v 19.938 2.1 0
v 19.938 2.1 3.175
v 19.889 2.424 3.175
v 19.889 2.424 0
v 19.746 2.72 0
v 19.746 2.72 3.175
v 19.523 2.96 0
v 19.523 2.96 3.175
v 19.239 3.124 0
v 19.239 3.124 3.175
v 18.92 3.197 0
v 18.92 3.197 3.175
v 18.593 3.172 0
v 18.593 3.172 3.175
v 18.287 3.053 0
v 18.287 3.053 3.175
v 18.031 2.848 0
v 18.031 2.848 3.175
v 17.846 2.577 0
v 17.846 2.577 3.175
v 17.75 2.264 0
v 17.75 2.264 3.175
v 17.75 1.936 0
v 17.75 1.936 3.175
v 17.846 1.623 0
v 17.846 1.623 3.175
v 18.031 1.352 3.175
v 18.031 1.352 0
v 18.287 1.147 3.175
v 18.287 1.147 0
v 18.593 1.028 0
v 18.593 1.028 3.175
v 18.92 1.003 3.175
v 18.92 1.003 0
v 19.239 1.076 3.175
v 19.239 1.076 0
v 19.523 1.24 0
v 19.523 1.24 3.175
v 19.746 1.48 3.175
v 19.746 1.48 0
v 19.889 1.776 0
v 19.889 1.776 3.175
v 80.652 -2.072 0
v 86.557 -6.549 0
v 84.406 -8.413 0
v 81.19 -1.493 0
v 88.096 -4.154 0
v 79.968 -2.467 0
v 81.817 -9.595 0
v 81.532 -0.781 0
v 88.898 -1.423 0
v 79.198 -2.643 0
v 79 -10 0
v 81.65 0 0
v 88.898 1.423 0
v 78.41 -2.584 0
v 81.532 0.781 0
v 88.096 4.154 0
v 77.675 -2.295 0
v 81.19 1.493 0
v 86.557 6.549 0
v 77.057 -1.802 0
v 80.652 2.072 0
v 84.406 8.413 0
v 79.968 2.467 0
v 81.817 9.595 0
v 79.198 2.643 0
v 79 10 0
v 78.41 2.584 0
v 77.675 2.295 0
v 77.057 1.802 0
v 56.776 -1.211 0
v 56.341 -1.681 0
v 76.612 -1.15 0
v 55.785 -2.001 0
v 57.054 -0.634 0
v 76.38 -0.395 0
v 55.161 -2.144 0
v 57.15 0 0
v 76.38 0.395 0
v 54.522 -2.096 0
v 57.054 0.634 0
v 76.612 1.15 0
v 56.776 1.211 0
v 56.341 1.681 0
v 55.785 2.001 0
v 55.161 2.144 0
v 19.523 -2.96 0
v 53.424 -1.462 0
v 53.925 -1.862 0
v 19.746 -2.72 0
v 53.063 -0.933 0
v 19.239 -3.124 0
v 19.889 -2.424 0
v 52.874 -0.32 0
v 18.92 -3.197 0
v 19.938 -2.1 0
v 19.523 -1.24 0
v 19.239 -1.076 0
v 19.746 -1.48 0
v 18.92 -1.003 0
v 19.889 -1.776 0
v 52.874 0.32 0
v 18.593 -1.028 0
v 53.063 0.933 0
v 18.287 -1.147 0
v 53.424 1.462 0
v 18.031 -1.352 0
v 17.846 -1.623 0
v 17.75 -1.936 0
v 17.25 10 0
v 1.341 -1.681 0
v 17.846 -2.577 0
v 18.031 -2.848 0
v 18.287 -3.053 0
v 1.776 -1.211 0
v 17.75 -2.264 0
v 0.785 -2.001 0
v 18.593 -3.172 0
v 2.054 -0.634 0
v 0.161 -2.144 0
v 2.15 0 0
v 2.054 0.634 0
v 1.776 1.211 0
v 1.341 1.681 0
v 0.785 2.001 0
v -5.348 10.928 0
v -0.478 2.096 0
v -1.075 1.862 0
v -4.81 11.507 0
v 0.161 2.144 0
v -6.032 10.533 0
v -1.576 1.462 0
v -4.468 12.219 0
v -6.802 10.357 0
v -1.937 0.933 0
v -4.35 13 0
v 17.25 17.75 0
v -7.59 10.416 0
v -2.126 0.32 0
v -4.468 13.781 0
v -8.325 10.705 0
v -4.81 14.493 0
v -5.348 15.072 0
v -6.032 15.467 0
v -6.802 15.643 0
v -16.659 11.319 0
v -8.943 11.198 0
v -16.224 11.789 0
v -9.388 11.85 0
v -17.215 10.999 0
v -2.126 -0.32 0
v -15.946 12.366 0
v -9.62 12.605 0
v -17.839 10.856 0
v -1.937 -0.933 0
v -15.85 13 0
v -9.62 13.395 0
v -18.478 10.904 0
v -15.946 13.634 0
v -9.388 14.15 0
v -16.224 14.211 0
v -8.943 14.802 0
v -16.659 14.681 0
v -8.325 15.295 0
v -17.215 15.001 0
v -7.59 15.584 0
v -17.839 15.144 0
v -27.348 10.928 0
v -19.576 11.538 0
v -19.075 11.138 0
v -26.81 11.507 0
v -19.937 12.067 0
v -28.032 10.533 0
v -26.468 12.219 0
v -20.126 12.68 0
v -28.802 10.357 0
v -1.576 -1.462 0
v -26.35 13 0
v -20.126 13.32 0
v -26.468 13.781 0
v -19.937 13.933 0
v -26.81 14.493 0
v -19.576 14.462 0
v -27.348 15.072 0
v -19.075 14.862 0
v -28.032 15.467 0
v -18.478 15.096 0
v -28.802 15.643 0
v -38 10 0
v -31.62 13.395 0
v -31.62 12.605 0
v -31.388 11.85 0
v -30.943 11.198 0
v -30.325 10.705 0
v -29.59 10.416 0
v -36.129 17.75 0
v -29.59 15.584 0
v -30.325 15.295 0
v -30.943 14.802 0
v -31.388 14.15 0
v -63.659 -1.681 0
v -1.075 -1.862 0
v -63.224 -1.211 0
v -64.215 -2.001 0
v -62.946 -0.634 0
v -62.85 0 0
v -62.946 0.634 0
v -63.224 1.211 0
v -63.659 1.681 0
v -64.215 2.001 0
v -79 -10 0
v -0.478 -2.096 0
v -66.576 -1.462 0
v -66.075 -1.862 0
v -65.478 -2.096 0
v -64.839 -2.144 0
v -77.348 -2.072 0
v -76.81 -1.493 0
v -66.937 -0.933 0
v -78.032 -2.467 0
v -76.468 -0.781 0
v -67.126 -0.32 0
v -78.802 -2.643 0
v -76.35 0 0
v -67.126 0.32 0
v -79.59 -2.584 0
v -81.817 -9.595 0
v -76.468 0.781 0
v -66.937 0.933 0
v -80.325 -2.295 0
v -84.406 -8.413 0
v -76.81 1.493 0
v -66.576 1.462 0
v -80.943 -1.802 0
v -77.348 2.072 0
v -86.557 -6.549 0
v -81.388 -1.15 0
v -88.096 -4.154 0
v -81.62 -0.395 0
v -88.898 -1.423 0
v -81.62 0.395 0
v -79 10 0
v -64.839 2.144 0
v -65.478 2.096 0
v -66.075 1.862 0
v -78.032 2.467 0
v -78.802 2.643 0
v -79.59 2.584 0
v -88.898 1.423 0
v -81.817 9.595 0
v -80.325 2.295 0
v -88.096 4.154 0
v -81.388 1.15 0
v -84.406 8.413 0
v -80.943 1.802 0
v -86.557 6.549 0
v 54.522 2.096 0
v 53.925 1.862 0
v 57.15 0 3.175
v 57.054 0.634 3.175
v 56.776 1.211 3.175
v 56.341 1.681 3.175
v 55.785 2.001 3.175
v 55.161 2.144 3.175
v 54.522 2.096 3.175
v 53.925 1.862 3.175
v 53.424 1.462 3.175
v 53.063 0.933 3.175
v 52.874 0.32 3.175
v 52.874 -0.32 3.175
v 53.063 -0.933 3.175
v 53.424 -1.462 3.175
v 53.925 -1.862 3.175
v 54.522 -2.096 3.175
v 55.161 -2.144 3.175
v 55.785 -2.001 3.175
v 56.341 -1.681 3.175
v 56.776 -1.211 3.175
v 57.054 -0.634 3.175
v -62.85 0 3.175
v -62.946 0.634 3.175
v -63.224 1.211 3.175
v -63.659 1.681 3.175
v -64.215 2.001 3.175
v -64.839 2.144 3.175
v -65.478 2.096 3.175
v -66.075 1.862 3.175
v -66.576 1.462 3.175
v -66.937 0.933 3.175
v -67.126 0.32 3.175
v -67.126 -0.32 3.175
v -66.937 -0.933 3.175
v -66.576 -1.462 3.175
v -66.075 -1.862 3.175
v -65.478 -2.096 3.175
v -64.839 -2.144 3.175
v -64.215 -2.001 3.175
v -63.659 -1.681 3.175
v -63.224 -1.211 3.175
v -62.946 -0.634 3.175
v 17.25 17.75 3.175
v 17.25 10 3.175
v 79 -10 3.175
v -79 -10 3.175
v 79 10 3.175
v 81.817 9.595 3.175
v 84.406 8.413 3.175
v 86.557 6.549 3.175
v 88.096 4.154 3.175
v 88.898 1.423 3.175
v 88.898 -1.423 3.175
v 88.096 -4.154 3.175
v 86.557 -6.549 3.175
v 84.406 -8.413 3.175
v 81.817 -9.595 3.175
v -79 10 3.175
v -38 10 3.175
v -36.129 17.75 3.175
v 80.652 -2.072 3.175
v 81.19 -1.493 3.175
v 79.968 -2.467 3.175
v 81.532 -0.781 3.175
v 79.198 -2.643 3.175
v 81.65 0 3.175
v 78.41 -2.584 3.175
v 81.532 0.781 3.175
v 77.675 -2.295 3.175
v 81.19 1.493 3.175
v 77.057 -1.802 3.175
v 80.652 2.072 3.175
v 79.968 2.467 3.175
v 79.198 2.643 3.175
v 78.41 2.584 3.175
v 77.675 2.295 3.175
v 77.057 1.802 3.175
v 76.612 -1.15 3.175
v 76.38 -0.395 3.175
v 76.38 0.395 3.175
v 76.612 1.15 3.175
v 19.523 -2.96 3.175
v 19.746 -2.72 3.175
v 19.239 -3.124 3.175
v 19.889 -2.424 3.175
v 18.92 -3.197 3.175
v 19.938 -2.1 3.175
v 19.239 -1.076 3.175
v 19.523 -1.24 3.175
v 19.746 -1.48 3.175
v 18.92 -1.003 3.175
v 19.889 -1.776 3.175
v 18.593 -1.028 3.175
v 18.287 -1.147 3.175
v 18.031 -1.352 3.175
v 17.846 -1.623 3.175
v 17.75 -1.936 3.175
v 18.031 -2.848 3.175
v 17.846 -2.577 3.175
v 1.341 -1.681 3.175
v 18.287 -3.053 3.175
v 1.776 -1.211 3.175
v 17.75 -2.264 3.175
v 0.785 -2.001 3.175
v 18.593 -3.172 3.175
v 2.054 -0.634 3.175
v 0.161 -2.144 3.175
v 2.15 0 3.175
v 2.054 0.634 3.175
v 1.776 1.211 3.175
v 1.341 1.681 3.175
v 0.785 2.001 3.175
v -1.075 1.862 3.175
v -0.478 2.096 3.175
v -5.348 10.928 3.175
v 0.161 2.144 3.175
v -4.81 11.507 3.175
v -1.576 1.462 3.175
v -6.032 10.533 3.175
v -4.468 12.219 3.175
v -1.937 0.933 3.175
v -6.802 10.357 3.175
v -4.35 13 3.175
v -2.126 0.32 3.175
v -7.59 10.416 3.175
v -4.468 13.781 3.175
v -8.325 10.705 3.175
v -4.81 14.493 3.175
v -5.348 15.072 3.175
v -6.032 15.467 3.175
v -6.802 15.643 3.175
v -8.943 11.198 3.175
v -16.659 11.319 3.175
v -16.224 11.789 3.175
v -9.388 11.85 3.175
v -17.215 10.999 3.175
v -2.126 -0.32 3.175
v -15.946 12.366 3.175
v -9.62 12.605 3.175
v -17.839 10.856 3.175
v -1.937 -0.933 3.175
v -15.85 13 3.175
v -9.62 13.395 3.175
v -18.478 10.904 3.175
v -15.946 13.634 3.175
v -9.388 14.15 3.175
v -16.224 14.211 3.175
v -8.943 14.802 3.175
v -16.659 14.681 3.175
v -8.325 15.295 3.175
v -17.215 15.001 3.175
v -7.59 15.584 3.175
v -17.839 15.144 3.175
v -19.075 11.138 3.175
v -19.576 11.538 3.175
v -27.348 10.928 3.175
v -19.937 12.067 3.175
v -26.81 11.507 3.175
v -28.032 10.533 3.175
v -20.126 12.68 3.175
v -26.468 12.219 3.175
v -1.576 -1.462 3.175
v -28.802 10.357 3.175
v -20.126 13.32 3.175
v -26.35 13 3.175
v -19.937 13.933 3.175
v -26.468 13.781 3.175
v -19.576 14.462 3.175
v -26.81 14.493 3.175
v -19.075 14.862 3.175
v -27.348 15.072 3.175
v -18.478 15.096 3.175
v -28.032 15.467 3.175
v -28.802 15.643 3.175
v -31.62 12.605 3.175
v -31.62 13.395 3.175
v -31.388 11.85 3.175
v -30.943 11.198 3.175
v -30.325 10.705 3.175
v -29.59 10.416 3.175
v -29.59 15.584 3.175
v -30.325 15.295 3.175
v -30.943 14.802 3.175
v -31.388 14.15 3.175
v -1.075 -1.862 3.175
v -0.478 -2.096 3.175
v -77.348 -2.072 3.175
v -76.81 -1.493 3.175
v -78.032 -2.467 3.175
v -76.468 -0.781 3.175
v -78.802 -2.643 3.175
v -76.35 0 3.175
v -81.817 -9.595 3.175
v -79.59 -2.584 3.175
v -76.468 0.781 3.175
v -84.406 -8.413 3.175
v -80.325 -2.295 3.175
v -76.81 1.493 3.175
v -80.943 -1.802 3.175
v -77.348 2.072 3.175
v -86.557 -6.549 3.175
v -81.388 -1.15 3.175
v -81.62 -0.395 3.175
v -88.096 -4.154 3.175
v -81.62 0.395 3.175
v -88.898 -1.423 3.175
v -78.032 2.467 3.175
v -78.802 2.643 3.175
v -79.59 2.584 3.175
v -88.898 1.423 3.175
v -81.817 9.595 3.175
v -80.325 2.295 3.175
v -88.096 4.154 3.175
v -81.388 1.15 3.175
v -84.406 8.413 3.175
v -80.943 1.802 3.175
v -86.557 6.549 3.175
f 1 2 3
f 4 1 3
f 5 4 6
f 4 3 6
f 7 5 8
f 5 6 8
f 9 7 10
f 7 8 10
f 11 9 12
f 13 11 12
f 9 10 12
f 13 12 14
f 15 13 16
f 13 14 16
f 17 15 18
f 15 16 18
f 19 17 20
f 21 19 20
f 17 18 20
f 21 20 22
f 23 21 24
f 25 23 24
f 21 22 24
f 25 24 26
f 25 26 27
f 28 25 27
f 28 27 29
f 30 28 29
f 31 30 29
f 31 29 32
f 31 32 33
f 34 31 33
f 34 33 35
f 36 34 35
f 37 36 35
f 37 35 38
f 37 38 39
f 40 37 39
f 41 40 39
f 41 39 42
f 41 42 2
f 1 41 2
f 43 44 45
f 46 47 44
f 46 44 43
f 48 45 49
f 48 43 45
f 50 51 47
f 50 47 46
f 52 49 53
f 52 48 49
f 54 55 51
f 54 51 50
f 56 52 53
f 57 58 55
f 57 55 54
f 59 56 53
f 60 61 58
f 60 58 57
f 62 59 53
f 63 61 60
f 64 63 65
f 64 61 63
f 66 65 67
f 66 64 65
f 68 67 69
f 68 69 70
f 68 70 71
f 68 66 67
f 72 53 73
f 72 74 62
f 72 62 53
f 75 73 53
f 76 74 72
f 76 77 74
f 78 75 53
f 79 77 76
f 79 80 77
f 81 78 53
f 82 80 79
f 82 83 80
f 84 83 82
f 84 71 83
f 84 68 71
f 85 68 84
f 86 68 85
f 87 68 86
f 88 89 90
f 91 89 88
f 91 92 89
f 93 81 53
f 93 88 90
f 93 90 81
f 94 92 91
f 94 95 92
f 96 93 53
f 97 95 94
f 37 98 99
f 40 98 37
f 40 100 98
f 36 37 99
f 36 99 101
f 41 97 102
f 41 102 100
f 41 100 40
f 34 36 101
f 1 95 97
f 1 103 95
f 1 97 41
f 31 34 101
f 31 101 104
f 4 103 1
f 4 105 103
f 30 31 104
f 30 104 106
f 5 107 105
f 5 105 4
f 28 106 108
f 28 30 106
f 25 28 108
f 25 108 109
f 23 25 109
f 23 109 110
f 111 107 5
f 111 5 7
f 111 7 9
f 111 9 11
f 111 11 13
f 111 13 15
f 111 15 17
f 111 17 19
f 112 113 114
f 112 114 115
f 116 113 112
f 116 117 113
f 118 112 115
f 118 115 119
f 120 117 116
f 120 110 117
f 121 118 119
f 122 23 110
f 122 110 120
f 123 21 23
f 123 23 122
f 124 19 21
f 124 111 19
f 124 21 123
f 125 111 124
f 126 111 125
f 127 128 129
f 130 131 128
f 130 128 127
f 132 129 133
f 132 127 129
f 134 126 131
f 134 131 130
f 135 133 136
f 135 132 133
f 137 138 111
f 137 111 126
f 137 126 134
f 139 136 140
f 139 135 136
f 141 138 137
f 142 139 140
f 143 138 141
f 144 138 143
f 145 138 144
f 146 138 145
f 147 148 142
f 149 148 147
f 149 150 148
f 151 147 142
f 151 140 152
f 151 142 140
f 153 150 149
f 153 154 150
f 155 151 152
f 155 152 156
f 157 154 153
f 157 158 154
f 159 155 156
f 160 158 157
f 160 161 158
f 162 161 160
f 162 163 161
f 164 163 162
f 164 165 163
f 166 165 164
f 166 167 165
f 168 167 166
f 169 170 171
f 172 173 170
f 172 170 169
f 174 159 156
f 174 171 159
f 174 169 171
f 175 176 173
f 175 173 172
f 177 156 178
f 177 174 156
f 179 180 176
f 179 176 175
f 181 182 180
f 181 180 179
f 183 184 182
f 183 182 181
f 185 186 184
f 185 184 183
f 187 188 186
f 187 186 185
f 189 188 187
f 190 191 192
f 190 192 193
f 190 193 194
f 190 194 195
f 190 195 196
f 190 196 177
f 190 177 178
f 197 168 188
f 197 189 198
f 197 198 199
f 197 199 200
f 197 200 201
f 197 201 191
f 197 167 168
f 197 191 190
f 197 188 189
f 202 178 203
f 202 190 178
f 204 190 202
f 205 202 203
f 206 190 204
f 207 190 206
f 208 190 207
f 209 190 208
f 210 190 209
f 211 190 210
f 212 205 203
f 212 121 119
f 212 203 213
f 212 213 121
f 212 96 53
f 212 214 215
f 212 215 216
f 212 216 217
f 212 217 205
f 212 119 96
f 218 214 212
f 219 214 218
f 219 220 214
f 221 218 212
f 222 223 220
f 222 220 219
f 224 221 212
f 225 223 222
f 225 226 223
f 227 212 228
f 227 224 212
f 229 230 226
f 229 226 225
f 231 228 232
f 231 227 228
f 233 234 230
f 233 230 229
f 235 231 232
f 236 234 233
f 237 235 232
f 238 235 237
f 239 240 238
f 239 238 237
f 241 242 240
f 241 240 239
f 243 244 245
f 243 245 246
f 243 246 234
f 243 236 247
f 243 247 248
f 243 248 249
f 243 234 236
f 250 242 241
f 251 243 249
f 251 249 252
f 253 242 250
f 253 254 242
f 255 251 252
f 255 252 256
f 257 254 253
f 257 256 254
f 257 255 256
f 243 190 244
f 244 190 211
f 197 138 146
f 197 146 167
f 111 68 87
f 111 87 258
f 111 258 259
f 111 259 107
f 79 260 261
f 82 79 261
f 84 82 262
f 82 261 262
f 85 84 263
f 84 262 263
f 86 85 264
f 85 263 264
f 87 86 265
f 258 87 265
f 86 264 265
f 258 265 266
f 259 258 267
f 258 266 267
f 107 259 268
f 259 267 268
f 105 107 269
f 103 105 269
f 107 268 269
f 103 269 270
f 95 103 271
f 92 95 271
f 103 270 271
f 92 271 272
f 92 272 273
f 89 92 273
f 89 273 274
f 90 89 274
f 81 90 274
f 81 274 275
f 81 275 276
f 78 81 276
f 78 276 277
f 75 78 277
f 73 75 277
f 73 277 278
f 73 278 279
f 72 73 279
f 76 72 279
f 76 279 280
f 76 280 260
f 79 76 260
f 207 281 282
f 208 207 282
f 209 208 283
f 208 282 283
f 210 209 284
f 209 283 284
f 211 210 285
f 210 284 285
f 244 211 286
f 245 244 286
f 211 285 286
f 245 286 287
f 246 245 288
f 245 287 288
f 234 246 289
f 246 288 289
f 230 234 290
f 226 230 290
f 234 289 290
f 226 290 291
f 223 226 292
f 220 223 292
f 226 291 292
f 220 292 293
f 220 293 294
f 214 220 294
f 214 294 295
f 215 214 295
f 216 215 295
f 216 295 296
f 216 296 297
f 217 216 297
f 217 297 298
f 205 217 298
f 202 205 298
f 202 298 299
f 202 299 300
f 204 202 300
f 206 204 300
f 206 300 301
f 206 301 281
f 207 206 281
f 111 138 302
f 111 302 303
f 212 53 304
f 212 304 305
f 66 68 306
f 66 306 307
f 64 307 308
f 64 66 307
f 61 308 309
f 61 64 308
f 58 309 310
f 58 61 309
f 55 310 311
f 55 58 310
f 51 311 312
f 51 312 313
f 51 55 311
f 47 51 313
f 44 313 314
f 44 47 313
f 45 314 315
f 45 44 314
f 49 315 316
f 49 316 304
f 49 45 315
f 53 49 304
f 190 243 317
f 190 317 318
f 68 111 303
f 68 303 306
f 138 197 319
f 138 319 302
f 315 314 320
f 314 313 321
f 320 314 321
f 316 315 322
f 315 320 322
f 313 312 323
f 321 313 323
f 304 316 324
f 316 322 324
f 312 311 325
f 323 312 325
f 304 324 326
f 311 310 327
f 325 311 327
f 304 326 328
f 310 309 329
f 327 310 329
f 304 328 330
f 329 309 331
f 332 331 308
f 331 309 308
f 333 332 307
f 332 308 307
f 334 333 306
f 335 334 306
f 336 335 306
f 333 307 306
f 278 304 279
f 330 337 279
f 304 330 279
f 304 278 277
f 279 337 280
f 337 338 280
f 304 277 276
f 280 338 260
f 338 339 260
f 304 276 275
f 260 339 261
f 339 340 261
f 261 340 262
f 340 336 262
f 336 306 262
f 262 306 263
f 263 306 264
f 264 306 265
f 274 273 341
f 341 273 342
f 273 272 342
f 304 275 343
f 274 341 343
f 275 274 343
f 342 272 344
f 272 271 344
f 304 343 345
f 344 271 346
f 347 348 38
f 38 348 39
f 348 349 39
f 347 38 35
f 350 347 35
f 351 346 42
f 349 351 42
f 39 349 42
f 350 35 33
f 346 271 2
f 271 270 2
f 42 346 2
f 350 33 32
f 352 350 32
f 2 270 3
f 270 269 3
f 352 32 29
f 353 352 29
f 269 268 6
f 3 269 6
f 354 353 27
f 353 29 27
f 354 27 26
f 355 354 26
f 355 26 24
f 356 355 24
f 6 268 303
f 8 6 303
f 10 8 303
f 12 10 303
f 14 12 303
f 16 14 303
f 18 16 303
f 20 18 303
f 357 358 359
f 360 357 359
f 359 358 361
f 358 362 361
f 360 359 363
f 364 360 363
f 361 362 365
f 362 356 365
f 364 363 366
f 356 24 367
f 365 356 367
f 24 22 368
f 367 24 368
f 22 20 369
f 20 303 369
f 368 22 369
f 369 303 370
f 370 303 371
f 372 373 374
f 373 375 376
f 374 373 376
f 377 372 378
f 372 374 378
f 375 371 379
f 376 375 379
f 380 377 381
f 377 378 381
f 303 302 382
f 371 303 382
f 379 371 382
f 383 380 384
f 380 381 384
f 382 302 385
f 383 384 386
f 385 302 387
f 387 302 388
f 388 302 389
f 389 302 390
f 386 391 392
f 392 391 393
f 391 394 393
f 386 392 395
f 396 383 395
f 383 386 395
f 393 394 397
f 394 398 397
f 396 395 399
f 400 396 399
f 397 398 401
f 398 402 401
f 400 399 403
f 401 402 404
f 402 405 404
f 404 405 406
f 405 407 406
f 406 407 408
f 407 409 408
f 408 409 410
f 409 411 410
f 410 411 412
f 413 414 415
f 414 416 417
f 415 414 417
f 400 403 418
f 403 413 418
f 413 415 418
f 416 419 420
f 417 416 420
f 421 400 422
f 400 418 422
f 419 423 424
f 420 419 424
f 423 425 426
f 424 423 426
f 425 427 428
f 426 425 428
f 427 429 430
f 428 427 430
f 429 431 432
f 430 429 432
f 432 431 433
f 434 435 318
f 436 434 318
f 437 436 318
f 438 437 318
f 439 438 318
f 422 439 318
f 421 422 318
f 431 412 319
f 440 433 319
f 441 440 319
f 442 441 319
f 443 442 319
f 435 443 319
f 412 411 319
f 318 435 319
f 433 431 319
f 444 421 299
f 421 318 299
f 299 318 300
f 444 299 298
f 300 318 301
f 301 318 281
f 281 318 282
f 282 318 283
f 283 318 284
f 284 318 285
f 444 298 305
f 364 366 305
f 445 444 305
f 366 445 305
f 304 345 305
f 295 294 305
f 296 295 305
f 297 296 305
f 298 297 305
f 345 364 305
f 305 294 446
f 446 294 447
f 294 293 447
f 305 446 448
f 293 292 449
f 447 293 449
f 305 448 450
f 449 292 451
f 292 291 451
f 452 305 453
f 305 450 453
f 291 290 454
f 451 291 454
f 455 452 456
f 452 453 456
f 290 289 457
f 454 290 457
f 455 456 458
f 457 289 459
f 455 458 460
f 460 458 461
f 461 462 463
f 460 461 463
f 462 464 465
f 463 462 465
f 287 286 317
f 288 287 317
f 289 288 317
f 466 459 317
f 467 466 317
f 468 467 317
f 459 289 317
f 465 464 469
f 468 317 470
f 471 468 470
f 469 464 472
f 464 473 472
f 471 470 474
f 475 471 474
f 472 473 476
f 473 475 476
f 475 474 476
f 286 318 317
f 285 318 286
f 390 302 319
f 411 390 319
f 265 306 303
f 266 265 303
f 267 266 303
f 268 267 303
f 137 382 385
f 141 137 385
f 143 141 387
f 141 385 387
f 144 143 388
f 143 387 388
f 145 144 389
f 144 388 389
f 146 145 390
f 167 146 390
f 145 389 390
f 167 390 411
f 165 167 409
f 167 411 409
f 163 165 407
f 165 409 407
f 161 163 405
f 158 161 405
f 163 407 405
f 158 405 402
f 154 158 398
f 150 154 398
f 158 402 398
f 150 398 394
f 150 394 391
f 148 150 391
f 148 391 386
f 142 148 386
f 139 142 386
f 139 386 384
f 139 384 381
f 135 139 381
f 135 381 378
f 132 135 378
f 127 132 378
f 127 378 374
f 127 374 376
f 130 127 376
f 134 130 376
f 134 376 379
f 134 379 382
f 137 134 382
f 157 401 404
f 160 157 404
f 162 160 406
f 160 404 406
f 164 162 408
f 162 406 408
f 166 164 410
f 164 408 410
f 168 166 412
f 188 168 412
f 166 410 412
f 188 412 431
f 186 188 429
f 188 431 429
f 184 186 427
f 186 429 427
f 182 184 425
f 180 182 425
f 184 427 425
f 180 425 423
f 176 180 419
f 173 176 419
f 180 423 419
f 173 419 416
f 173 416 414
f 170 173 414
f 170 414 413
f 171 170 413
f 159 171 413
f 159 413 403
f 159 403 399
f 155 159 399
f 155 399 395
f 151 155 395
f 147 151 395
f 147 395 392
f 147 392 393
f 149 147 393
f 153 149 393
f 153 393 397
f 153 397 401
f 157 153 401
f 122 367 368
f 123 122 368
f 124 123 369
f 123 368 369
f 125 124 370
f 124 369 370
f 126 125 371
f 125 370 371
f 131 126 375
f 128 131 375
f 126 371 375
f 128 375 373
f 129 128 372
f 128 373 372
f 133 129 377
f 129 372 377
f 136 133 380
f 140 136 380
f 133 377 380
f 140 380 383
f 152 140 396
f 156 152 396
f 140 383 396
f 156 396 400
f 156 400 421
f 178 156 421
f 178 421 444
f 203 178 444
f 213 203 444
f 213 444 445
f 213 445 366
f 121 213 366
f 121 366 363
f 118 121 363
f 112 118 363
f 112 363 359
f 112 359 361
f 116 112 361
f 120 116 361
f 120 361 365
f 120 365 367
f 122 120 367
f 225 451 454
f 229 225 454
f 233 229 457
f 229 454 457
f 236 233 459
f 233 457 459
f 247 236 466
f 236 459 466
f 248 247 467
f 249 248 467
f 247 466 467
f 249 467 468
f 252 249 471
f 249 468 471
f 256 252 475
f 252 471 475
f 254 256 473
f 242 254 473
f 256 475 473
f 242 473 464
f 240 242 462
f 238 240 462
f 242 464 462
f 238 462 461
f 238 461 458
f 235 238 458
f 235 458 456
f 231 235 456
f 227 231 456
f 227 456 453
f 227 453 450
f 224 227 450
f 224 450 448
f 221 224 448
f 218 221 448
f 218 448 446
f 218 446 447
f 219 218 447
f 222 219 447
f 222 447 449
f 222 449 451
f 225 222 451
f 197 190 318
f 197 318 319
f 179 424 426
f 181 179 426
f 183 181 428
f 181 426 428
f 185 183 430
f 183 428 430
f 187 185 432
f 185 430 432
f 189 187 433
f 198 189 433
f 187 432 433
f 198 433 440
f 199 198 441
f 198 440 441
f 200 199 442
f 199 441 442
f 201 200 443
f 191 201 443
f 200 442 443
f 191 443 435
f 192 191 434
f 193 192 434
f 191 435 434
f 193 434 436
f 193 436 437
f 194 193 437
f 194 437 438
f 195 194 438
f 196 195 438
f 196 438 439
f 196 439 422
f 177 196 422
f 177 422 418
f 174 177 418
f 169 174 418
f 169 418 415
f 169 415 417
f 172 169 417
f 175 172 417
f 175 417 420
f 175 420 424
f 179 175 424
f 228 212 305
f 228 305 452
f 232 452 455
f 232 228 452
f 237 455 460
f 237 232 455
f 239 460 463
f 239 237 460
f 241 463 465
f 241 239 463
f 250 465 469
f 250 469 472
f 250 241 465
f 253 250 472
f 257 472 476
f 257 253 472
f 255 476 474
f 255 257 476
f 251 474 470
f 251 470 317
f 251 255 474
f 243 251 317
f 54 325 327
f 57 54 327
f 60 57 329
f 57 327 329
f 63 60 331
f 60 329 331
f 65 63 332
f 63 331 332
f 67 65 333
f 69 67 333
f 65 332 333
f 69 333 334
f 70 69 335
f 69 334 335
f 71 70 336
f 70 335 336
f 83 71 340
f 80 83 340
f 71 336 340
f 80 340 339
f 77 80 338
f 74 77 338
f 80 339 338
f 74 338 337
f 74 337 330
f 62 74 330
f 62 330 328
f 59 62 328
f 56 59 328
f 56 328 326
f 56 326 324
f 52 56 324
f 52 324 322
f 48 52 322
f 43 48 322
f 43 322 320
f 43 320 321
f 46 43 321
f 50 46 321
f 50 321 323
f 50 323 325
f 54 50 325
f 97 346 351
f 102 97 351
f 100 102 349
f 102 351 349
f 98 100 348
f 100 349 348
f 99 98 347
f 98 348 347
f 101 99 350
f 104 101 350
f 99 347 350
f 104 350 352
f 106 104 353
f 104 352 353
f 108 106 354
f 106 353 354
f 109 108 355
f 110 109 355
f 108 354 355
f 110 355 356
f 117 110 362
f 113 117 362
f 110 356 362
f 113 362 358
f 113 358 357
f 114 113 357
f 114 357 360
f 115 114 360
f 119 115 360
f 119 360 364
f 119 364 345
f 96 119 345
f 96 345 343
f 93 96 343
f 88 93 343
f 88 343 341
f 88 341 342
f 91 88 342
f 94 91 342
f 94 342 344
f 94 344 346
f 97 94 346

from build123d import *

# Parameters (mm, degrees)
BOSS_EXTRUDE1_DEPTH  = 3.175
M5_CLEARANCE_HOLE1_D = 5.3
BOSS_EXTRUDE2_DEPTH  = 3.175
M5_CLEARANCE_HOLE2_D = 5.3
M4_CLEARANCE_HOLE1_D = 4.3
M2_CLEARANCE_HOLE1_D = 2.2


with BuildPart() as part:
    # Sketch1 → Boss-Extrude1 (new body)
    with BuildSketch(Plane.XY):
        with BuildLine():
            Line((-79, 10), (79, 10))
            ThreePointArc((79, 10), (89, 0), (79, -10))
            Line((79, -10), (-79, -10))
            ThreePointArc((-79, -10), (-89, 0), (-79, 10))
        make_face()
    extrude(amount=BOSS_EXTRUDE1_DEPTH)

    # M5 Clearance Hole1 (through all)
    with Locations(Plane(origin=(0, 0, 0), x_dir=(-1, 0, 0), z_dir=(0, 0, -1))):
        with Locations((-79, 0), (79, 0)):
            Hole(M5_CLEARANCE_HOLE1_D / 2)

    # Sketch8 → Boss-Extrude2 (add)
    with BuildSketch(Plane(origin=(0, 0, 0), x_dir=(-1, 0, 0), z_dir=(0, 0, -1))):
        Polygon((38, 10), (36.129310345, 17.75), (-17.25, 17.75), (-17.25, 10), align=None)
    extrude(amount=-BOSS_EXTRUDE2_DEPTH)

    # M5 Clearance Hole2 (through all)
    with Locations(Plane(origin=(0, 0, 0), x_dir=(-1, 0, 0), z_dir=(0, 0, -1))):
        with Locations((7, 13), (29, 13)):
            Hole(M5_CLEARANCE_HOLE2_D / 2)

    # M4 Clearance Hole1 (through all)
    with Locations(Plane(origin=(0, 0, 0), x_dir=(-1, 0, 0), z_dir=(0, 0, -1))):
        with Locations((0, 0), (-55, 0), (18, 13), (65, 0)):
            Hole(M4_CLEARANCE_HOLE1_D / 2)

    # M2 Clearance Hole1 (through all)
    with Locations(Plane(origin=(0, 0, 0), x_dir=(-1, 0, 0), z_dir=(0, 0, -1))):
        with Locations((-18.8375, -2.1), (-18.8375, 2.1)):
            Hole(M2_CLEARANCE_HOLE1_D / 2)


solid = part.part
